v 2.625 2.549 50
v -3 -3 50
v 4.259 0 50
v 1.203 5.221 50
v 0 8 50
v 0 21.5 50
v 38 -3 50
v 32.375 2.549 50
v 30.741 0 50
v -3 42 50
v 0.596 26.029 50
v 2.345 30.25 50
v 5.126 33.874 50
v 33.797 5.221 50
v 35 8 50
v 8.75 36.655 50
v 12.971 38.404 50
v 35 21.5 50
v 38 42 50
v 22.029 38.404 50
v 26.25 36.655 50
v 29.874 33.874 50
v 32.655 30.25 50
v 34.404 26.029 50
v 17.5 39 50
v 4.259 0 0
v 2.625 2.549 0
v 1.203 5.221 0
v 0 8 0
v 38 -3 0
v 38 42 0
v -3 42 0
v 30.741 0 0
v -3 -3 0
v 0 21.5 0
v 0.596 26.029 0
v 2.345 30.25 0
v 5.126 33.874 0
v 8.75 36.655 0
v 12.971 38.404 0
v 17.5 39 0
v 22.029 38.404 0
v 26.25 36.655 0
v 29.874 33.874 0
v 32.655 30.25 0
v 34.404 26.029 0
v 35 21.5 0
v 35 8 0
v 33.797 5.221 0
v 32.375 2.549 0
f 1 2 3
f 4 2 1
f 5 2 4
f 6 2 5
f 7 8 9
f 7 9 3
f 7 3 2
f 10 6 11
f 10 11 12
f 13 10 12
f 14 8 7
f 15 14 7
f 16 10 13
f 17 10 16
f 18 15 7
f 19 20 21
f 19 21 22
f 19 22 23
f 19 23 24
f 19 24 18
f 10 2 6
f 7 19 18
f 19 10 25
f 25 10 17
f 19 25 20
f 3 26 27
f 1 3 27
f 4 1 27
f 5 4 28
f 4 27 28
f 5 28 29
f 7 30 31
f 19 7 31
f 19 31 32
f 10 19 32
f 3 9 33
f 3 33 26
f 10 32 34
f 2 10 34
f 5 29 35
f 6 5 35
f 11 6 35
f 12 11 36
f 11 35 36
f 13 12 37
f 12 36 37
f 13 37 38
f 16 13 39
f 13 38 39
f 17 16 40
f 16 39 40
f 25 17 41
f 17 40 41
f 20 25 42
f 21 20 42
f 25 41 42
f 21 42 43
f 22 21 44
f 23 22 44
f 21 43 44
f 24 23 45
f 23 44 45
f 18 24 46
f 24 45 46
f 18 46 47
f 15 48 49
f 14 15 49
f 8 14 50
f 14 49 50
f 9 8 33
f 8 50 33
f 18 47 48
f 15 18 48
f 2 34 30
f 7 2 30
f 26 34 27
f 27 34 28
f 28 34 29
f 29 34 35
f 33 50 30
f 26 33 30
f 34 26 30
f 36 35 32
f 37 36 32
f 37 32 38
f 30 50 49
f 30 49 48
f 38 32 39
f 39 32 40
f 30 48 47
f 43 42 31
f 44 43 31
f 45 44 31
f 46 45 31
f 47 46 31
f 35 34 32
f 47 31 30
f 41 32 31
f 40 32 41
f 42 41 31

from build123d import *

# Parameters (mm, degrees)
F1_DEPTH = 50


with BuildPart() as f1:
    # F0 (on Top) → F1 (new body)
    with BuildSketch(Plane.XY):
        Polygon((-3, 42), (-3, -3), (30.740852, -3), (38, -3), (38, 8), (38, 42), (17.5, 42), align=None)
        with BuildLine():
            Line((35, 21.5), (35, 8))
            ThreePointArc((35, 8), (33.112912, 3.870902), (30.740852, 0))
            Line((30.740852, 0), (4.259148, 0))
            ThreePointArc((4.259148, 0), (1.887088, 3.870902), (0, 8))
            Line((0, 8), (0, 21.5))
            ThreePointArc((0, 21.5), (17.5, 39), (35, 21.5))
        make_face(mode=Mode.SUBTRACT)
    extrude(amount=F1_DEPTH)


solid = f1.part
